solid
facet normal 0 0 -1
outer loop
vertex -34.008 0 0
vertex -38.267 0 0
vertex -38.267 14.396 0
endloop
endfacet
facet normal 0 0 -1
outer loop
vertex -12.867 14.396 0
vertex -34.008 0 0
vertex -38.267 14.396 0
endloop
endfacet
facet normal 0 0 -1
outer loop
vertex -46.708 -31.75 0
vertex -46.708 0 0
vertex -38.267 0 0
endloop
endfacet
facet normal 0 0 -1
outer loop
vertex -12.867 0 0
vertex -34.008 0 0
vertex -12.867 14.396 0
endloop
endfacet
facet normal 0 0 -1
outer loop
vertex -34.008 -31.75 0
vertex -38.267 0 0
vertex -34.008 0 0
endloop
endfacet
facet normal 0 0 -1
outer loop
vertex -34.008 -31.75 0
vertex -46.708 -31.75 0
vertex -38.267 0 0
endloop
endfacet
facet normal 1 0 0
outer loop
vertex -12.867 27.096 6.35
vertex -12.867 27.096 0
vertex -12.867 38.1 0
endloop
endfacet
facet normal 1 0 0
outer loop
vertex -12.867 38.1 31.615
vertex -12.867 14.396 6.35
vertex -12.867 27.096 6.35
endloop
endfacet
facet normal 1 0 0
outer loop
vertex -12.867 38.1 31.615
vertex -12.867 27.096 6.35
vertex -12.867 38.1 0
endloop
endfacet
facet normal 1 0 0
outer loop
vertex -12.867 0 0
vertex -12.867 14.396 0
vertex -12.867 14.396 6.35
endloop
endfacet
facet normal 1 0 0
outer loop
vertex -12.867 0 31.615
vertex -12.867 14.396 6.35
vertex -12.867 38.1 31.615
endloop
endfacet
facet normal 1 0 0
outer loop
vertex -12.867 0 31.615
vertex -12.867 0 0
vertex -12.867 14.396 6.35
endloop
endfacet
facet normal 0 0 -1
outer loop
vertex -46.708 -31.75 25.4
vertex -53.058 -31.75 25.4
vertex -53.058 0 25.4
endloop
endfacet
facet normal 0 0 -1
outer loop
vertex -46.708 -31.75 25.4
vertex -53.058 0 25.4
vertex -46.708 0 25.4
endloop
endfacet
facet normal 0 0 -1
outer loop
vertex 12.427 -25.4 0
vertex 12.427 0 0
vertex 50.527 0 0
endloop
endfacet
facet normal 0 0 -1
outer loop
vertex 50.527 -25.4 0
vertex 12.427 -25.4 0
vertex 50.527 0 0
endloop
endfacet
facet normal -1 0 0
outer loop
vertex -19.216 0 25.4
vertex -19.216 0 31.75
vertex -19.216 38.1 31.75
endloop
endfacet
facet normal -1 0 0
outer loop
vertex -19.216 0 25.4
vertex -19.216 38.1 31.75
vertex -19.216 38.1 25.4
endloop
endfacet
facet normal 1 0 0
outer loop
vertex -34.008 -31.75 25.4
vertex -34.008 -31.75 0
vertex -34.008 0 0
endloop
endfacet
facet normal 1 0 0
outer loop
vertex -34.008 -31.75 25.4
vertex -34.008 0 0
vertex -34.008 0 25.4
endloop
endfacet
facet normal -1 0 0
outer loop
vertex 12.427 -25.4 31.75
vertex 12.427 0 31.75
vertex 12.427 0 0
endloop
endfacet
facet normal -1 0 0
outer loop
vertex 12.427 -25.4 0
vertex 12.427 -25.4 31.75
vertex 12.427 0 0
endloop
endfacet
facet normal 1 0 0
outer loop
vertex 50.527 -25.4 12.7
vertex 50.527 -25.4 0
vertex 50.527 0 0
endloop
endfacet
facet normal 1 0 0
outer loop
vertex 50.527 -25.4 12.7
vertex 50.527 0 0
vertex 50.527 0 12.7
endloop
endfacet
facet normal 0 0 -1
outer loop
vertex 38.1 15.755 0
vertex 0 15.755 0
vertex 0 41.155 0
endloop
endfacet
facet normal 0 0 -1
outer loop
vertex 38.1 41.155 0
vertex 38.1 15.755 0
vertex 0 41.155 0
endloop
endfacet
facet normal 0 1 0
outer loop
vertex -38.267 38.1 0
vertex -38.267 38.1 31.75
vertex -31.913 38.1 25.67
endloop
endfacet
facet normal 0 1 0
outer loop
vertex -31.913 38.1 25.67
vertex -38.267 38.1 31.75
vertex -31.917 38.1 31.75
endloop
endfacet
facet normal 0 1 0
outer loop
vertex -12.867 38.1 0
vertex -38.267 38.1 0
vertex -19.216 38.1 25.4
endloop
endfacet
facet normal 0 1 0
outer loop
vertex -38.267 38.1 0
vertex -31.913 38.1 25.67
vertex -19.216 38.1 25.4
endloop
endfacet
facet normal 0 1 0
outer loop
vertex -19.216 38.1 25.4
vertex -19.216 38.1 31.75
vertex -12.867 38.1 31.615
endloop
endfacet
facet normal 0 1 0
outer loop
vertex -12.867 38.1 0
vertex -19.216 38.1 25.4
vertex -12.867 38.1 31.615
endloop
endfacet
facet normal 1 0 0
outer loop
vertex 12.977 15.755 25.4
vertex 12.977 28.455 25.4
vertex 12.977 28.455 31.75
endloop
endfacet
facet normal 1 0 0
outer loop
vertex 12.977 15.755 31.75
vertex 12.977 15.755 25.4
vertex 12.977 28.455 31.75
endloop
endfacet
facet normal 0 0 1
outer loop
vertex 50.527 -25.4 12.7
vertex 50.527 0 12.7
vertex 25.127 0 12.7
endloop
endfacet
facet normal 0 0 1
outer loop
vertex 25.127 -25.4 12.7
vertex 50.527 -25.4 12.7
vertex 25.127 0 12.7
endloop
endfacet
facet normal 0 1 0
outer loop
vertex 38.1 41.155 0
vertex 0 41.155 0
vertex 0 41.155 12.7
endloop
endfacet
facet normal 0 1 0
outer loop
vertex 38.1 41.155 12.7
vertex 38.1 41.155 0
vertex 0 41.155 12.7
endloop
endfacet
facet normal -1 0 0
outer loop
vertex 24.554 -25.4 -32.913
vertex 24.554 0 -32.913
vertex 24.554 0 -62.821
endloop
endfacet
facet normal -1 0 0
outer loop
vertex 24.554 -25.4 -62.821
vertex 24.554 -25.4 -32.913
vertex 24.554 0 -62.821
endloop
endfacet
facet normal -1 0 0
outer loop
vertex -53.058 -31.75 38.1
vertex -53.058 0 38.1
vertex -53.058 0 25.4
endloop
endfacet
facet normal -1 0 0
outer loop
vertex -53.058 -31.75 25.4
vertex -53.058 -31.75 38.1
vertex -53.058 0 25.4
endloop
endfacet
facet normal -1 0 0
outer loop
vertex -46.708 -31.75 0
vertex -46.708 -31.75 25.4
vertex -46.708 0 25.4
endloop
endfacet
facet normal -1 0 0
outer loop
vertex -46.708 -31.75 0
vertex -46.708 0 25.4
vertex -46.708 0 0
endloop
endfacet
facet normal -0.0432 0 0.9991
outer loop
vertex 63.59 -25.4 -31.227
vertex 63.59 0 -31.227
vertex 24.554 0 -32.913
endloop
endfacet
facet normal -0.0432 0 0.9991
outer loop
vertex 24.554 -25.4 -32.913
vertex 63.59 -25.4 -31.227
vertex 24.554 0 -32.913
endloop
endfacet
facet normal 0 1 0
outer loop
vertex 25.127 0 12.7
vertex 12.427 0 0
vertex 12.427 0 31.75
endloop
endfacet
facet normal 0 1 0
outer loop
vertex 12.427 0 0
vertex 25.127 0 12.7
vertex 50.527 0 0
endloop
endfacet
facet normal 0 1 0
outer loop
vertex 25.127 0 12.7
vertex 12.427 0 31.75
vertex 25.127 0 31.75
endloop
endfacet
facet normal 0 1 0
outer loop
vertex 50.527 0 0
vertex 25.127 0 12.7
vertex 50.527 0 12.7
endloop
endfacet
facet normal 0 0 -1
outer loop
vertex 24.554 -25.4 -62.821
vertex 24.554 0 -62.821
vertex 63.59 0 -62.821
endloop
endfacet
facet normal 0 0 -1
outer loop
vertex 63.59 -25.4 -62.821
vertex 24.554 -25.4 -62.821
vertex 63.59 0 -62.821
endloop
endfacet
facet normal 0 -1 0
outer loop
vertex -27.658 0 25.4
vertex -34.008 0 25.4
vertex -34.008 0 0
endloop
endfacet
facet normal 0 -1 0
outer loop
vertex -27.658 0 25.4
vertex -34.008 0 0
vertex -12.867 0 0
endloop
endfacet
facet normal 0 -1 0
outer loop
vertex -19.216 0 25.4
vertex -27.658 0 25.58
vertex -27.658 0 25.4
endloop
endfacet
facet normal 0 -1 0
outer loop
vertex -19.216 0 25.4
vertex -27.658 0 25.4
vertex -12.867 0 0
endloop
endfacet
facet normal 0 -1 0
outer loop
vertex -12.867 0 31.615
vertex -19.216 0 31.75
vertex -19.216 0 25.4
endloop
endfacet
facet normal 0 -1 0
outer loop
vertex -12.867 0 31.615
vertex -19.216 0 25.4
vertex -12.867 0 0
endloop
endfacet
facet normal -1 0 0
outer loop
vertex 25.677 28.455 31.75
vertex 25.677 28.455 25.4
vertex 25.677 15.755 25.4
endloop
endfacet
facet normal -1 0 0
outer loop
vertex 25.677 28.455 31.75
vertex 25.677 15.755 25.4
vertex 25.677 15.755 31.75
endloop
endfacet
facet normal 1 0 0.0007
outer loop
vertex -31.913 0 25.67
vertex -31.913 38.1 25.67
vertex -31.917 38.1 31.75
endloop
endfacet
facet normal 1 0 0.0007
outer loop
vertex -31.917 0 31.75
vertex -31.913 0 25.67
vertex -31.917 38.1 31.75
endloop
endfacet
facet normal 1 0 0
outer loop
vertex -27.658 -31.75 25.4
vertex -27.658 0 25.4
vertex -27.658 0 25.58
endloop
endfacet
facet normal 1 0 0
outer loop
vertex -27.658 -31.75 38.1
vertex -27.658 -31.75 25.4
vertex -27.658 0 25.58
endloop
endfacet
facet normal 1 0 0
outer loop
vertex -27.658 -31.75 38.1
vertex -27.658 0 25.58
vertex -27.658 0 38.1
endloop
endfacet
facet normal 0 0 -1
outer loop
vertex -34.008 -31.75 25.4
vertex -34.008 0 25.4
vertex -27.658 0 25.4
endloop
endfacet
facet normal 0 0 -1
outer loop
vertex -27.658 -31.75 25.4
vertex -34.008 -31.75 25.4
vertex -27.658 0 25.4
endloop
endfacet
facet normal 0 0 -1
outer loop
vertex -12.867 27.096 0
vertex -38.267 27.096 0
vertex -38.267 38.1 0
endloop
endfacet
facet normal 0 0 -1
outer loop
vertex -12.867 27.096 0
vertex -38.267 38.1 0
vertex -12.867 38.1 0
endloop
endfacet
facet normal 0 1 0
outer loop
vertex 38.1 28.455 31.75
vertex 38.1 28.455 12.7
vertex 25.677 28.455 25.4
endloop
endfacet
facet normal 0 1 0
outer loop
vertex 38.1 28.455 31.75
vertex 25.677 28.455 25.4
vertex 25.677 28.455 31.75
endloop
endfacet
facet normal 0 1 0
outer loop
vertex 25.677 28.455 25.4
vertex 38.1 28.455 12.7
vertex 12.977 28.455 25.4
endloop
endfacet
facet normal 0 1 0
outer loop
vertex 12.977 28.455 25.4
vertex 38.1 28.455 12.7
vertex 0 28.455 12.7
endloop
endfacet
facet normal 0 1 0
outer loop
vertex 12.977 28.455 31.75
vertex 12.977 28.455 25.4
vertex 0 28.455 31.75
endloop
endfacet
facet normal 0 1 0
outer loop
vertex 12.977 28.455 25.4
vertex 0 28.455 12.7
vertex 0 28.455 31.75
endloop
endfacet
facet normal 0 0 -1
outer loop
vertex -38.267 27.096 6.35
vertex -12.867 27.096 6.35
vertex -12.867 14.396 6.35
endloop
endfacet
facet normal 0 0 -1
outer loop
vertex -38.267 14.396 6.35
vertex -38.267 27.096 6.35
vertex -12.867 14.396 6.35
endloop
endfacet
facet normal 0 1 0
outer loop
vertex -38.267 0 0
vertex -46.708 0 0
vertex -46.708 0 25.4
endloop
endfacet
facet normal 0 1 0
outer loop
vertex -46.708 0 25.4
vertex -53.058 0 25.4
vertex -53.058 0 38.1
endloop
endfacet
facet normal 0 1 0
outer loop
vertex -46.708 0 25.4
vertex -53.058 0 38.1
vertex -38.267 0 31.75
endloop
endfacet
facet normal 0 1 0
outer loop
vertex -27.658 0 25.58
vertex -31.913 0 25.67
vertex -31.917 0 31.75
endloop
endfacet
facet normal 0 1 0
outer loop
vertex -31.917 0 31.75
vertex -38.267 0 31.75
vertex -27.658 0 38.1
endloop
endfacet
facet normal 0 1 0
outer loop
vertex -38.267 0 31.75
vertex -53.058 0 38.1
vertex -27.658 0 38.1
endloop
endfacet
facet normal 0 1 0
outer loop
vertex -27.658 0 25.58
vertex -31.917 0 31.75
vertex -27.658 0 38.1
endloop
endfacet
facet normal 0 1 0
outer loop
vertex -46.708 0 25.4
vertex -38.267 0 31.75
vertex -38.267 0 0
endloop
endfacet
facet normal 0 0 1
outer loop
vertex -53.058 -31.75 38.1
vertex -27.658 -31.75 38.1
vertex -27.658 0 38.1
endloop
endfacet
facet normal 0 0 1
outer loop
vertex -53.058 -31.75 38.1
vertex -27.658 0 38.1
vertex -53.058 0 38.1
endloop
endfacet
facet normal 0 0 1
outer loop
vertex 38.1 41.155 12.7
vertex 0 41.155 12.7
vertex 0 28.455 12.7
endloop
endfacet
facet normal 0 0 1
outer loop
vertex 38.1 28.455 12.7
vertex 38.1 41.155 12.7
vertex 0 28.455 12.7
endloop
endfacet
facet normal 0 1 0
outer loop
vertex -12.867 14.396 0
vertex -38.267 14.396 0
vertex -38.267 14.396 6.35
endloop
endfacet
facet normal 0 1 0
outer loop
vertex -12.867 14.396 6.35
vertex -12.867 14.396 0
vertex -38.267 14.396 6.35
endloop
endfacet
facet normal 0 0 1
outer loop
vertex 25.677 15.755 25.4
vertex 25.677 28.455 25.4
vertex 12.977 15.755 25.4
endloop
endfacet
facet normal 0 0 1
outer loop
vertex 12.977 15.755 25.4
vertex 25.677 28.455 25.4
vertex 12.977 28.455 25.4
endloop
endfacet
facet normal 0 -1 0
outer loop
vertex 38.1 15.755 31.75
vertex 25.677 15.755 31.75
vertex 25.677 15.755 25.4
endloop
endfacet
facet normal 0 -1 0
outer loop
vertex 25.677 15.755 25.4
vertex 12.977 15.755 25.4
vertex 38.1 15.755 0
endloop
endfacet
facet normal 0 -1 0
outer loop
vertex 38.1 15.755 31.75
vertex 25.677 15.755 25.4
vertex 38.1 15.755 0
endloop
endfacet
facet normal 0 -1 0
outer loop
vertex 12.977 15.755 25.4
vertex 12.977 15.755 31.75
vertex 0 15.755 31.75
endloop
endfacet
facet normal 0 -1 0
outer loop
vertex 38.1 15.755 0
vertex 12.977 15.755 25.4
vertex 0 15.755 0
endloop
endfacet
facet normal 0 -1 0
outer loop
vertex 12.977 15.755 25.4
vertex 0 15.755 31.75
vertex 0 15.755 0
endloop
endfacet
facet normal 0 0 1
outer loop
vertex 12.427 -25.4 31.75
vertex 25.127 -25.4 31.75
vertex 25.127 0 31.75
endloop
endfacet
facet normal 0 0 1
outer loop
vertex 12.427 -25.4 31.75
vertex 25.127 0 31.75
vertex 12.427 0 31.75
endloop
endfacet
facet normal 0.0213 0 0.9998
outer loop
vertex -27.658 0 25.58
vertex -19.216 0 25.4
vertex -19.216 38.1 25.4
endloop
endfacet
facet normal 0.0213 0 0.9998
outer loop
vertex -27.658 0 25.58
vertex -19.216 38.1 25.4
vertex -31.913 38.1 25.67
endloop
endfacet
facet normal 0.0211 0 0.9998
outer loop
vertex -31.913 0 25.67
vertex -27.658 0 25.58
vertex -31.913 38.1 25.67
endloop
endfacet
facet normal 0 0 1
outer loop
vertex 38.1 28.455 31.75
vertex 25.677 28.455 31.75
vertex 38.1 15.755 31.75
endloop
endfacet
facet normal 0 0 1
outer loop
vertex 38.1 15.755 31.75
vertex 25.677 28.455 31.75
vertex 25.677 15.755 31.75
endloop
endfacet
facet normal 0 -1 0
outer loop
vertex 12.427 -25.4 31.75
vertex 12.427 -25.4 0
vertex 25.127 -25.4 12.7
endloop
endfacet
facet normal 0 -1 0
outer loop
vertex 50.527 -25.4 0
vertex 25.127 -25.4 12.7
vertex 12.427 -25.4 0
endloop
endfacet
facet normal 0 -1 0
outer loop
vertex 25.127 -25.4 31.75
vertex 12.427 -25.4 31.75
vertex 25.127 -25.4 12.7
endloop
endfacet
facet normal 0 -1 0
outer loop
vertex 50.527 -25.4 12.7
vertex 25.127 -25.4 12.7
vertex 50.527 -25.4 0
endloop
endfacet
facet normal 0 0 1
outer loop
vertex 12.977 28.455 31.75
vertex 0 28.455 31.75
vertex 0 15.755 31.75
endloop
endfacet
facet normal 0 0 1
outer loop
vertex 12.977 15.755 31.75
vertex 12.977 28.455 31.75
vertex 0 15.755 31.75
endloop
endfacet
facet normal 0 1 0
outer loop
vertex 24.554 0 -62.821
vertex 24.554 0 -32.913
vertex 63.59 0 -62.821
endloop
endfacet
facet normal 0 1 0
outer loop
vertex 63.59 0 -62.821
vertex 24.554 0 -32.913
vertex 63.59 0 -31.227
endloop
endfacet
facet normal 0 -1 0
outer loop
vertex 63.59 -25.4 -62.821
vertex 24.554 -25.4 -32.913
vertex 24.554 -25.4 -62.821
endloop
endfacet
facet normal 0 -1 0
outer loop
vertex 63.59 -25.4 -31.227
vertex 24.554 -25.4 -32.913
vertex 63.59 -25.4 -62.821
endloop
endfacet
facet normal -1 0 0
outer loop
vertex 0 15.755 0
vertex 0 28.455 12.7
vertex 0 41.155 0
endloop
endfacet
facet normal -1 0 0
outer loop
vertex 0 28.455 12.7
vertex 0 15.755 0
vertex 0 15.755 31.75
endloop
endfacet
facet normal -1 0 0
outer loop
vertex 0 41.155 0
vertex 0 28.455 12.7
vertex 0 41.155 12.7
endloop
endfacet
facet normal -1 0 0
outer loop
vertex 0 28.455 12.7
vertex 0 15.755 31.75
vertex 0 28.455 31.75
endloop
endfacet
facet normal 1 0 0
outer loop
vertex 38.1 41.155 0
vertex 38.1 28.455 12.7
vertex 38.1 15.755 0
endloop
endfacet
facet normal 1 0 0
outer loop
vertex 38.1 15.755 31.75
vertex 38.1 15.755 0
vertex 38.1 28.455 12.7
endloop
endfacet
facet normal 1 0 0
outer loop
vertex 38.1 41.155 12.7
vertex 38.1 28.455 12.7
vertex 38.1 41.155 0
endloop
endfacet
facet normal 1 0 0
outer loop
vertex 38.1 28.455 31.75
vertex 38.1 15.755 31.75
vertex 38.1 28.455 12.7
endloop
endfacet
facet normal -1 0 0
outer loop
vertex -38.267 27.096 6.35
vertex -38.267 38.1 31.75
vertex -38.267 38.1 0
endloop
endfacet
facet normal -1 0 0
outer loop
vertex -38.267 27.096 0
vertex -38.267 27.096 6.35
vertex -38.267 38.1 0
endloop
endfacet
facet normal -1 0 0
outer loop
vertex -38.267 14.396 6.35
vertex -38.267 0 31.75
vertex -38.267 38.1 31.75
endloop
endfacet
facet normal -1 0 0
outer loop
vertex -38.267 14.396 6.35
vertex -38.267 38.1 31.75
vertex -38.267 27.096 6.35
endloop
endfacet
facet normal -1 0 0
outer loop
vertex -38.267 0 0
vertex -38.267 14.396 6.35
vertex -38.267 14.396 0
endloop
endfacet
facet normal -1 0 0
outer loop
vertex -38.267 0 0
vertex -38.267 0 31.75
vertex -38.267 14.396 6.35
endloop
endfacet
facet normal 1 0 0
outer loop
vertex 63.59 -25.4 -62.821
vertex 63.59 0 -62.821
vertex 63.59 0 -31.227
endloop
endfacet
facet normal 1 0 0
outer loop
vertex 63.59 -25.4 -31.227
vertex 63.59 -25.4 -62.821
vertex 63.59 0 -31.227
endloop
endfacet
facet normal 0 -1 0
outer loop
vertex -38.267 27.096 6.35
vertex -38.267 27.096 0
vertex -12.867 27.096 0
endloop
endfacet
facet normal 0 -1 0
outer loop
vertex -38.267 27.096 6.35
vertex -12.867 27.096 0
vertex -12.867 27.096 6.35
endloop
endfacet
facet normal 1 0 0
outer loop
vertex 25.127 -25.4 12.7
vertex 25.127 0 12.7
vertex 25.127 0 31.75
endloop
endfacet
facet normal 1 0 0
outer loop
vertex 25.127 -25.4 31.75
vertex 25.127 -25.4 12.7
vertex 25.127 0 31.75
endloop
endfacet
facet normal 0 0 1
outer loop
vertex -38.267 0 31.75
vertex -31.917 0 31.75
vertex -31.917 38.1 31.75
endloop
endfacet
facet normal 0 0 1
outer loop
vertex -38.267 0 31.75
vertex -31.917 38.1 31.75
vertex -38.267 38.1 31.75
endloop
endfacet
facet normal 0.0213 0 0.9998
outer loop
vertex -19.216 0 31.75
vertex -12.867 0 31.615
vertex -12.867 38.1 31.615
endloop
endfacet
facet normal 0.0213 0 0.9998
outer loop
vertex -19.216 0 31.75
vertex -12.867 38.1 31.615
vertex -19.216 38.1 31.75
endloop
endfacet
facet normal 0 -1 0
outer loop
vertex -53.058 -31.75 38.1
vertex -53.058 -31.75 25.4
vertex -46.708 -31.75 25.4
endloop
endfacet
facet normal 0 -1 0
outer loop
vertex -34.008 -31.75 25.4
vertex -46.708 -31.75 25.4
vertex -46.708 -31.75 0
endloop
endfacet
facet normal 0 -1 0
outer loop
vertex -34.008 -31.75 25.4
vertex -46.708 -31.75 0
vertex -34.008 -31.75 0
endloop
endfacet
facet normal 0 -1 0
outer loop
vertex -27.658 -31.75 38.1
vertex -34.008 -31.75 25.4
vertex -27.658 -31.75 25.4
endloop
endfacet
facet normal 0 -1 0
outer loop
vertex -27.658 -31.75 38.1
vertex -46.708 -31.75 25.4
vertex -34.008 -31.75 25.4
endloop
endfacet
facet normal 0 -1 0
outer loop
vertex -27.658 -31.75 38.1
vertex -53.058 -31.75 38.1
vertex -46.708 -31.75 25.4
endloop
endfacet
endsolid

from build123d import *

# Parameters (mm, degrees)
F1_DEPTH  = 25.4
F3_DEPTH  = 31.75
F5_DEPTH  = 38.1
F6_W      = 12.7
F6_H      = 6.35
F7_DEPTH  = 25.4
F9_DEPTH  = 38.1
F10_W     = 12.7
F10_H     = 6.35
F11_DEPTH = 25.4
F13_DEPTH = 25.4


with BuildPart() as f1:
    # F0 (on Front) → F1 (new body)
    with BuildSketch(Plane.XZ):
        Polygon((25.126881, 31.75), (12.426881, 31.75), (12.426881, 0), (50.526881, 0), (50.526881, 12.7), (25.126881, 12.7), align=None)
    extrude(amount=F1_DEPTH)


with BuildPart() as f3:
    # F2 (on Front) → F3 (new body)
    with BuildSketch(Plane.XZ):
        Polygon((-27.65778, 38.1), (-53.05778, 38.1), (-53.05778, 25.4), (-46.70778, 25.4), (-46.70778, 0), (-34.00778, 0), (-34.00778, 25.4), (-27.65778, 25.4), align=None)
    extrude(amount=F3_DEPTH)

    # F8 (on Front) → F9 (join)
    with BuildSketch(Plane.XZ):
        Polygon((-38.267327, 0), (-12.867327, 0), (-12.867327, 31.614923), (-19.21589, 31.75), (-19.21589, 25.4), (-31.913016, 25.670154), (-31.917327, 31.75), (-38.267327, 31.75), align=None)
    extrude(amount=-F9_DEPTH)

    # F10 (on face) → F11 (cut)
    with BuildSketch(Plane(origin=(-38.267327, 0, 0), x_dir=(0, -1, 0), z_dir=(-1, 0, 0))):
        with Locations((-20.745586, 3.175)):
            Rectangle(F10_W, F10_H)
    extrude(amount=-F11_DEPTH, mode=Mode.SUBTRACT)


with BuildPart() as f5:
    # F4 (on Right) → F5 (new body)
    with BuildSketch(Plane.YZ):
        Polygon((15.754736, 31.75), (15.754736, 0), (41.154736, 0), (41.154736, 12.7), (28.454736, 12.7), (28.454736, 31.75), align=None)
    extrude(amount=F5_DEPTH)

    # F6 (on face) → F7 (cut)
    with BuildSketch(Plane(origin=(0, 28.454736, 0), x_dir=(-1, 0, 0), z_dir=(0, 1, 0))):
        with Locations((-19.326969, 28.575)):
            Rectangle(F6_W, F6_H)
    extrude(amount=-F7_DEPTH, mode=Mode.SUBTRACT)


with BuildPart() as f13:
    # F12 (on Front) → F13 (new body)
    with BuildSketch(Plane.XZ):
        Polygon((63.590296, -31.227414), (24.553783, -32.91278), (24.553783, -62.821284), (63.590296, -62.821284), align=None)
    extrude(amount=F13_DEPTH)


solid = Compound([f1.part, f3.part, f5.part, f13.part])
